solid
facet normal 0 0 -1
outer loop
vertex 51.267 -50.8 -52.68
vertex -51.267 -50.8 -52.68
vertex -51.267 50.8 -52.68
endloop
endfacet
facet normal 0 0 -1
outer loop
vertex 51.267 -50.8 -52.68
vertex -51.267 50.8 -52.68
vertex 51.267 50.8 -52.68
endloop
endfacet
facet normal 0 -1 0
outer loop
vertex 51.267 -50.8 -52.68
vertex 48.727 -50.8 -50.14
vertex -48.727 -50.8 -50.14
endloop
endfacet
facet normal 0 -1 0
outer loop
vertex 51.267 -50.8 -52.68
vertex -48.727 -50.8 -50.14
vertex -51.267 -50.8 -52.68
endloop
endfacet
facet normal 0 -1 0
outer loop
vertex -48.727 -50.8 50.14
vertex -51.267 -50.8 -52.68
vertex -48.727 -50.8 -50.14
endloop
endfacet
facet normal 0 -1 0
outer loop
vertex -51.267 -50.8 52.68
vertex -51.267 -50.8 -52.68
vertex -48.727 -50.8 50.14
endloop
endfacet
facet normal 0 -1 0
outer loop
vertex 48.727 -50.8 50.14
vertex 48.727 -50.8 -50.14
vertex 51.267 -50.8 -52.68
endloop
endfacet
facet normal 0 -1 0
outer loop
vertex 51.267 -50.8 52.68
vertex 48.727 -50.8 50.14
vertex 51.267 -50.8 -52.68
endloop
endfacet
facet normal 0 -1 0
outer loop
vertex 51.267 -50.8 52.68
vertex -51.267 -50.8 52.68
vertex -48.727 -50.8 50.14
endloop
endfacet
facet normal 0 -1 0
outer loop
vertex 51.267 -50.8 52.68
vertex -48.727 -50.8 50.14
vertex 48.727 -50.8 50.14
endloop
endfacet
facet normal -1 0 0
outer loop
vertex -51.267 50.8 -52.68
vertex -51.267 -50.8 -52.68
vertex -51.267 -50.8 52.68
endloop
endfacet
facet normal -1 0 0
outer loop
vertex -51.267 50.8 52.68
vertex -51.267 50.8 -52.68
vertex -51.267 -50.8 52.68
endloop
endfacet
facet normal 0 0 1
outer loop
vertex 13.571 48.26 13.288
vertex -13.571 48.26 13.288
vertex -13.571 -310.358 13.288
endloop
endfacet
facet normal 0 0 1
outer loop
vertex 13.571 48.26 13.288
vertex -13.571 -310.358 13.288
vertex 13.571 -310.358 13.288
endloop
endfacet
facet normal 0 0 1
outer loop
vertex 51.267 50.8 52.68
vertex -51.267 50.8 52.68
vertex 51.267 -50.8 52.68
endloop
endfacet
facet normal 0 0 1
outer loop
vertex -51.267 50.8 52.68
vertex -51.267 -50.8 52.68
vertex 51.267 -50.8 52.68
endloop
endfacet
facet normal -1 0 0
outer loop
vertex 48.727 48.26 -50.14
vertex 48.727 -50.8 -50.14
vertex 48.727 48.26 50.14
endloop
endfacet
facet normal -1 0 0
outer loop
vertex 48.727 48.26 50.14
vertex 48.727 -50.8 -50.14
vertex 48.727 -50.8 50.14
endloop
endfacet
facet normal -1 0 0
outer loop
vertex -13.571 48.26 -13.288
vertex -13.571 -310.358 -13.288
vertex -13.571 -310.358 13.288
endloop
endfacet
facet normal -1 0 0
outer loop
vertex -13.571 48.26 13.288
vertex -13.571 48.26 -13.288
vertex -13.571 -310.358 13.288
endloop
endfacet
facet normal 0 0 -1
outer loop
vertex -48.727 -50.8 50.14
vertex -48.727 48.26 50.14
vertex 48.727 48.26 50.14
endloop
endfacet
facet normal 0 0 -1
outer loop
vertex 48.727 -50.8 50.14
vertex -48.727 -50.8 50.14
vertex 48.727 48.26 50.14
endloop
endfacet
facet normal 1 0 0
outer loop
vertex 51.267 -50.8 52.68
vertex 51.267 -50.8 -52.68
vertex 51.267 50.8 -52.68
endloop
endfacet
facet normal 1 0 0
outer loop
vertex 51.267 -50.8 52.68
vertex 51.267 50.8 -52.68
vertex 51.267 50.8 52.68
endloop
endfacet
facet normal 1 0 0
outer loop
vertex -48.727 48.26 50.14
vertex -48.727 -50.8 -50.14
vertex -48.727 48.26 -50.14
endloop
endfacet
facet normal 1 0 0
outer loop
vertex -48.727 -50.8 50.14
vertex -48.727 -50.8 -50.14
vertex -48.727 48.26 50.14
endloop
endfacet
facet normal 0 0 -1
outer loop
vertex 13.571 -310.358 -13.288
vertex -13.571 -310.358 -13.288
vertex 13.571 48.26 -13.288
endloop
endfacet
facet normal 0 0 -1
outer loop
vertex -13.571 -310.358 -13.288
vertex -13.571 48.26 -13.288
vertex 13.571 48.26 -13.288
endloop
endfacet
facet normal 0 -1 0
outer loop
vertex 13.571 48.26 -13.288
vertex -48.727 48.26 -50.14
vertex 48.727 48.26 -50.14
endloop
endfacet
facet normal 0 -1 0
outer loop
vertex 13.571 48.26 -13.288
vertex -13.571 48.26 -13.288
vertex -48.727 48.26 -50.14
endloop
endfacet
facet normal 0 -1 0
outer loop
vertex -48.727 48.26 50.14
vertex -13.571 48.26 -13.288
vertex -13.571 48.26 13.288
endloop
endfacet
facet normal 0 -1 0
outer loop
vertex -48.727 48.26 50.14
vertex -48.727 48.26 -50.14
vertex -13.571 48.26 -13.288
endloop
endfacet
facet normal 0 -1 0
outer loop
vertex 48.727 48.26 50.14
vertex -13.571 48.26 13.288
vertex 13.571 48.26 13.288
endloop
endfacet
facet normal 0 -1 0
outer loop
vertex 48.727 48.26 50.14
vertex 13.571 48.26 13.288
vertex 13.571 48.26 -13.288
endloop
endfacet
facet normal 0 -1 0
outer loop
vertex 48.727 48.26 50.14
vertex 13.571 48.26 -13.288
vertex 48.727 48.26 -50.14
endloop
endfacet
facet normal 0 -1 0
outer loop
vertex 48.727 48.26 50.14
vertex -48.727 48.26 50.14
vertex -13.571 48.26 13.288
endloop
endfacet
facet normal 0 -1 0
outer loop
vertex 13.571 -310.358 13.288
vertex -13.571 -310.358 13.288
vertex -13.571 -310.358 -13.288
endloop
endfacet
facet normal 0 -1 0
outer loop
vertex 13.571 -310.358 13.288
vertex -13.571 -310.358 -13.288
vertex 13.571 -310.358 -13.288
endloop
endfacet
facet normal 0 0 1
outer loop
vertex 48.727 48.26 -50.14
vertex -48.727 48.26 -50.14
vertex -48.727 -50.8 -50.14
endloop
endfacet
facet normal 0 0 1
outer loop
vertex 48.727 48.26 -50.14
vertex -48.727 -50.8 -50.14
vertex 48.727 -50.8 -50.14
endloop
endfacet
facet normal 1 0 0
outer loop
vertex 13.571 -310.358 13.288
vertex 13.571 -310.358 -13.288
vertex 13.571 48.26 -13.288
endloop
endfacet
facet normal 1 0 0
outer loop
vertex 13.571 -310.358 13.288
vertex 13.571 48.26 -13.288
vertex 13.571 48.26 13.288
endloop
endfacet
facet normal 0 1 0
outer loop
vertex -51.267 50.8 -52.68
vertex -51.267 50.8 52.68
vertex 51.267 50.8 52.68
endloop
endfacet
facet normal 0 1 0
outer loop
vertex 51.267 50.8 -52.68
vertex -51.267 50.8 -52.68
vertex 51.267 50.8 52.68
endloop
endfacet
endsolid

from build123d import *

# Parameters (mm, degrees)
F0_W     = 102.5334298611
F0_H     = 105.3606420755
F1_DEPTH = 50.8
F2_T     = -2.54
F3_W     = 27.1412022412
F3_H     = 26.5757590532
F4_DEPTH = 48.26
F5_DEPTH = 310.35808


with BuildPart() as f1:
    # F0 (on Front) → F1 (new body, symmetric)
    with BuildSketch(Plane.XZ):
        Rectangle(F0_W, F0_H)
    extrude(amount=F1_DEPTH, both=True)

    # F2
    f2_openings = [f1.faces().sort_by_distance(p)[0] for p in [
        (0, -50.8, 0),
    ]]
    offset(amount=F2_T, openings=f2_openings)

    # F3 (on Front) → F4 (join, through all)
    with BuildSketch(Plane.XZ):
        Rectangle(F3_W, F3_H)
    extrude(amount=-F4_DEPTH)

    # F5 (add): a face of the model
    f5_faces = [f1.faces().sort_by_distance(p)[0] for p in [
        (0, 0, 0),
    ]]
    extrude(f5_faces, amount=F5_DEPTH)


solid = f1.part
